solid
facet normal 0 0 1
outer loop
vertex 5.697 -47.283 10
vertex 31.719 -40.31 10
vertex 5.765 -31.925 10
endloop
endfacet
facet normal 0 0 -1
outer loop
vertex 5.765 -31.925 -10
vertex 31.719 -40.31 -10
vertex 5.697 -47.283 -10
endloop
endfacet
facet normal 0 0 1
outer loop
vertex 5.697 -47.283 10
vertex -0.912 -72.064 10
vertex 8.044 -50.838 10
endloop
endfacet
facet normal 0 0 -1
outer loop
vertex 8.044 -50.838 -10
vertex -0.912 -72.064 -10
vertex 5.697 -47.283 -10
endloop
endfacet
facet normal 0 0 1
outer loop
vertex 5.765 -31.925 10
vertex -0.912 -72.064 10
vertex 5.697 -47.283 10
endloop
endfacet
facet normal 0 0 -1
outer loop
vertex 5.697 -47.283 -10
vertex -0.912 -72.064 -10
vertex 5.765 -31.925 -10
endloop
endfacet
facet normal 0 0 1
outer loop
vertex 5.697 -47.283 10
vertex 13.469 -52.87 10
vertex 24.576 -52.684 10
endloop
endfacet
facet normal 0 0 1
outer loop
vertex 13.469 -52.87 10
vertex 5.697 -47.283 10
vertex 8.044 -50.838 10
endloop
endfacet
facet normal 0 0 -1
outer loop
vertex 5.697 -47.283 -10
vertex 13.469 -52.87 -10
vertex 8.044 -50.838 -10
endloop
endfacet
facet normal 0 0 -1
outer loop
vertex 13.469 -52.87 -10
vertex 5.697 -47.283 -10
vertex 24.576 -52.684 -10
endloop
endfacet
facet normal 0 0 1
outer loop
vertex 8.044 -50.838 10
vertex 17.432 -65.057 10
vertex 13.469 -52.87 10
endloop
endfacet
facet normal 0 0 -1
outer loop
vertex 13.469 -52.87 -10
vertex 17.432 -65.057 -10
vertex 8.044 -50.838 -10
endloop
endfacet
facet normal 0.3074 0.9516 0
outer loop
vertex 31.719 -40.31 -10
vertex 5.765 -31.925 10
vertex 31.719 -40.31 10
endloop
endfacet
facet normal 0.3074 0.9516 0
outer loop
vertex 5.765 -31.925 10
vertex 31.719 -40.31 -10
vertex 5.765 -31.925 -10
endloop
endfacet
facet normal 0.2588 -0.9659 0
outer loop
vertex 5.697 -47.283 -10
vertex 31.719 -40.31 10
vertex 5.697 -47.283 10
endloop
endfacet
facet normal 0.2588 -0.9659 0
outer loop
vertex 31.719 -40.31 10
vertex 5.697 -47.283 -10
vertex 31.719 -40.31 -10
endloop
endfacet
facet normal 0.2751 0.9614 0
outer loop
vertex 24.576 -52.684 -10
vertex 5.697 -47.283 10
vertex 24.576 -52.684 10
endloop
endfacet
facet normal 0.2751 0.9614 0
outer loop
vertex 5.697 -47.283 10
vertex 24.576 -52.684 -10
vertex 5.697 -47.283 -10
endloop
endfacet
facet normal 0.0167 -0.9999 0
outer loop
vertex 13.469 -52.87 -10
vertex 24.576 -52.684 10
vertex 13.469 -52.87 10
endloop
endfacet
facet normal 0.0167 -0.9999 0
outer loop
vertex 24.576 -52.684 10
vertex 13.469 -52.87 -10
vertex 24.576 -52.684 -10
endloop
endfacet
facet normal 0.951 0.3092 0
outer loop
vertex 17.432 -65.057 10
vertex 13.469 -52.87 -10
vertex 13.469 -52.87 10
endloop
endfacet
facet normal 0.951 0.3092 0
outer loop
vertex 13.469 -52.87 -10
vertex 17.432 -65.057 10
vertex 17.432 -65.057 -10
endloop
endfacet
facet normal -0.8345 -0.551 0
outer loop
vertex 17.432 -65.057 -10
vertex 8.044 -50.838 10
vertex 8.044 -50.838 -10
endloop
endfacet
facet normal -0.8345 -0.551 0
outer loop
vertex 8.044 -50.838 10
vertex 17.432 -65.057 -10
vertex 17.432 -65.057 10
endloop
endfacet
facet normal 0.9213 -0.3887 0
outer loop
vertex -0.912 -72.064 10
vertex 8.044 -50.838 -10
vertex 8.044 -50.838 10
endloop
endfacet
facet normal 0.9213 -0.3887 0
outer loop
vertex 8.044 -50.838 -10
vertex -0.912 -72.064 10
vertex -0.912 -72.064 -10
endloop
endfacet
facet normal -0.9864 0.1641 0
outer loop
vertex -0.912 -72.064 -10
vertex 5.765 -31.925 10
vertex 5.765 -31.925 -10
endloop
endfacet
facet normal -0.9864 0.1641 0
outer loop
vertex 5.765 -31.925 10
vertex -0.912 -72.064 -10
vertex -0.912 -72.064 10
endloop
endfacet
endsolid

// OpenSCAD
polyhedron(
    points=[
    [5.76506233630291, -31.9246191247216, 10],
    [31.7194598552339, -40.3102839420935, 10],
    [5.69667591314034, -47.2830678841871, 10],
    [24.5757098552339, -52.6836218986637, 10],
    [13.4693178841871, -52.8704570812918, 10],
    [17.4319598552339, -65.0569598552339, 10],
    [8.04373270155905, -50.8378462783965, 10],
    [-0.911599707126918, -72.0639370089087, 10],
    [5.76506233630291, -31.9246191247216, -10],
    [31.7194598552339, -40.3102839420935, -10],
    [5.69667591314034, -47.2830678841871, -10],
    [24.5757098552339, -52.6836218986637, -10],
    [13.4693178841871, -52.8704570812918, -10],
    [17.4319598552339, -65.0569598552339, -10],
    [8.04373270155905, -50.8378462783965, -10],
    [-0.911599707126918, -72.0639370089087, -10],
    ],
    faces=[
        [0,1,2],
        [10,9,8],
        [6,7,2],
        [10,15,14],
        [2,7,0],
        [8,15,10],
        [2,3,4,6],
        [14,12,11,10],
        [4,5,6],
        [14,13,12],
        [0,8,9,1],
        [1,9,10,2],
        [2,10,11,3],
        [3,11,12,4],
        [4,12,13,5],
        [5,13,14,6],
        [6,14,15,7],
        [7,15,8,0],
    ]
);
